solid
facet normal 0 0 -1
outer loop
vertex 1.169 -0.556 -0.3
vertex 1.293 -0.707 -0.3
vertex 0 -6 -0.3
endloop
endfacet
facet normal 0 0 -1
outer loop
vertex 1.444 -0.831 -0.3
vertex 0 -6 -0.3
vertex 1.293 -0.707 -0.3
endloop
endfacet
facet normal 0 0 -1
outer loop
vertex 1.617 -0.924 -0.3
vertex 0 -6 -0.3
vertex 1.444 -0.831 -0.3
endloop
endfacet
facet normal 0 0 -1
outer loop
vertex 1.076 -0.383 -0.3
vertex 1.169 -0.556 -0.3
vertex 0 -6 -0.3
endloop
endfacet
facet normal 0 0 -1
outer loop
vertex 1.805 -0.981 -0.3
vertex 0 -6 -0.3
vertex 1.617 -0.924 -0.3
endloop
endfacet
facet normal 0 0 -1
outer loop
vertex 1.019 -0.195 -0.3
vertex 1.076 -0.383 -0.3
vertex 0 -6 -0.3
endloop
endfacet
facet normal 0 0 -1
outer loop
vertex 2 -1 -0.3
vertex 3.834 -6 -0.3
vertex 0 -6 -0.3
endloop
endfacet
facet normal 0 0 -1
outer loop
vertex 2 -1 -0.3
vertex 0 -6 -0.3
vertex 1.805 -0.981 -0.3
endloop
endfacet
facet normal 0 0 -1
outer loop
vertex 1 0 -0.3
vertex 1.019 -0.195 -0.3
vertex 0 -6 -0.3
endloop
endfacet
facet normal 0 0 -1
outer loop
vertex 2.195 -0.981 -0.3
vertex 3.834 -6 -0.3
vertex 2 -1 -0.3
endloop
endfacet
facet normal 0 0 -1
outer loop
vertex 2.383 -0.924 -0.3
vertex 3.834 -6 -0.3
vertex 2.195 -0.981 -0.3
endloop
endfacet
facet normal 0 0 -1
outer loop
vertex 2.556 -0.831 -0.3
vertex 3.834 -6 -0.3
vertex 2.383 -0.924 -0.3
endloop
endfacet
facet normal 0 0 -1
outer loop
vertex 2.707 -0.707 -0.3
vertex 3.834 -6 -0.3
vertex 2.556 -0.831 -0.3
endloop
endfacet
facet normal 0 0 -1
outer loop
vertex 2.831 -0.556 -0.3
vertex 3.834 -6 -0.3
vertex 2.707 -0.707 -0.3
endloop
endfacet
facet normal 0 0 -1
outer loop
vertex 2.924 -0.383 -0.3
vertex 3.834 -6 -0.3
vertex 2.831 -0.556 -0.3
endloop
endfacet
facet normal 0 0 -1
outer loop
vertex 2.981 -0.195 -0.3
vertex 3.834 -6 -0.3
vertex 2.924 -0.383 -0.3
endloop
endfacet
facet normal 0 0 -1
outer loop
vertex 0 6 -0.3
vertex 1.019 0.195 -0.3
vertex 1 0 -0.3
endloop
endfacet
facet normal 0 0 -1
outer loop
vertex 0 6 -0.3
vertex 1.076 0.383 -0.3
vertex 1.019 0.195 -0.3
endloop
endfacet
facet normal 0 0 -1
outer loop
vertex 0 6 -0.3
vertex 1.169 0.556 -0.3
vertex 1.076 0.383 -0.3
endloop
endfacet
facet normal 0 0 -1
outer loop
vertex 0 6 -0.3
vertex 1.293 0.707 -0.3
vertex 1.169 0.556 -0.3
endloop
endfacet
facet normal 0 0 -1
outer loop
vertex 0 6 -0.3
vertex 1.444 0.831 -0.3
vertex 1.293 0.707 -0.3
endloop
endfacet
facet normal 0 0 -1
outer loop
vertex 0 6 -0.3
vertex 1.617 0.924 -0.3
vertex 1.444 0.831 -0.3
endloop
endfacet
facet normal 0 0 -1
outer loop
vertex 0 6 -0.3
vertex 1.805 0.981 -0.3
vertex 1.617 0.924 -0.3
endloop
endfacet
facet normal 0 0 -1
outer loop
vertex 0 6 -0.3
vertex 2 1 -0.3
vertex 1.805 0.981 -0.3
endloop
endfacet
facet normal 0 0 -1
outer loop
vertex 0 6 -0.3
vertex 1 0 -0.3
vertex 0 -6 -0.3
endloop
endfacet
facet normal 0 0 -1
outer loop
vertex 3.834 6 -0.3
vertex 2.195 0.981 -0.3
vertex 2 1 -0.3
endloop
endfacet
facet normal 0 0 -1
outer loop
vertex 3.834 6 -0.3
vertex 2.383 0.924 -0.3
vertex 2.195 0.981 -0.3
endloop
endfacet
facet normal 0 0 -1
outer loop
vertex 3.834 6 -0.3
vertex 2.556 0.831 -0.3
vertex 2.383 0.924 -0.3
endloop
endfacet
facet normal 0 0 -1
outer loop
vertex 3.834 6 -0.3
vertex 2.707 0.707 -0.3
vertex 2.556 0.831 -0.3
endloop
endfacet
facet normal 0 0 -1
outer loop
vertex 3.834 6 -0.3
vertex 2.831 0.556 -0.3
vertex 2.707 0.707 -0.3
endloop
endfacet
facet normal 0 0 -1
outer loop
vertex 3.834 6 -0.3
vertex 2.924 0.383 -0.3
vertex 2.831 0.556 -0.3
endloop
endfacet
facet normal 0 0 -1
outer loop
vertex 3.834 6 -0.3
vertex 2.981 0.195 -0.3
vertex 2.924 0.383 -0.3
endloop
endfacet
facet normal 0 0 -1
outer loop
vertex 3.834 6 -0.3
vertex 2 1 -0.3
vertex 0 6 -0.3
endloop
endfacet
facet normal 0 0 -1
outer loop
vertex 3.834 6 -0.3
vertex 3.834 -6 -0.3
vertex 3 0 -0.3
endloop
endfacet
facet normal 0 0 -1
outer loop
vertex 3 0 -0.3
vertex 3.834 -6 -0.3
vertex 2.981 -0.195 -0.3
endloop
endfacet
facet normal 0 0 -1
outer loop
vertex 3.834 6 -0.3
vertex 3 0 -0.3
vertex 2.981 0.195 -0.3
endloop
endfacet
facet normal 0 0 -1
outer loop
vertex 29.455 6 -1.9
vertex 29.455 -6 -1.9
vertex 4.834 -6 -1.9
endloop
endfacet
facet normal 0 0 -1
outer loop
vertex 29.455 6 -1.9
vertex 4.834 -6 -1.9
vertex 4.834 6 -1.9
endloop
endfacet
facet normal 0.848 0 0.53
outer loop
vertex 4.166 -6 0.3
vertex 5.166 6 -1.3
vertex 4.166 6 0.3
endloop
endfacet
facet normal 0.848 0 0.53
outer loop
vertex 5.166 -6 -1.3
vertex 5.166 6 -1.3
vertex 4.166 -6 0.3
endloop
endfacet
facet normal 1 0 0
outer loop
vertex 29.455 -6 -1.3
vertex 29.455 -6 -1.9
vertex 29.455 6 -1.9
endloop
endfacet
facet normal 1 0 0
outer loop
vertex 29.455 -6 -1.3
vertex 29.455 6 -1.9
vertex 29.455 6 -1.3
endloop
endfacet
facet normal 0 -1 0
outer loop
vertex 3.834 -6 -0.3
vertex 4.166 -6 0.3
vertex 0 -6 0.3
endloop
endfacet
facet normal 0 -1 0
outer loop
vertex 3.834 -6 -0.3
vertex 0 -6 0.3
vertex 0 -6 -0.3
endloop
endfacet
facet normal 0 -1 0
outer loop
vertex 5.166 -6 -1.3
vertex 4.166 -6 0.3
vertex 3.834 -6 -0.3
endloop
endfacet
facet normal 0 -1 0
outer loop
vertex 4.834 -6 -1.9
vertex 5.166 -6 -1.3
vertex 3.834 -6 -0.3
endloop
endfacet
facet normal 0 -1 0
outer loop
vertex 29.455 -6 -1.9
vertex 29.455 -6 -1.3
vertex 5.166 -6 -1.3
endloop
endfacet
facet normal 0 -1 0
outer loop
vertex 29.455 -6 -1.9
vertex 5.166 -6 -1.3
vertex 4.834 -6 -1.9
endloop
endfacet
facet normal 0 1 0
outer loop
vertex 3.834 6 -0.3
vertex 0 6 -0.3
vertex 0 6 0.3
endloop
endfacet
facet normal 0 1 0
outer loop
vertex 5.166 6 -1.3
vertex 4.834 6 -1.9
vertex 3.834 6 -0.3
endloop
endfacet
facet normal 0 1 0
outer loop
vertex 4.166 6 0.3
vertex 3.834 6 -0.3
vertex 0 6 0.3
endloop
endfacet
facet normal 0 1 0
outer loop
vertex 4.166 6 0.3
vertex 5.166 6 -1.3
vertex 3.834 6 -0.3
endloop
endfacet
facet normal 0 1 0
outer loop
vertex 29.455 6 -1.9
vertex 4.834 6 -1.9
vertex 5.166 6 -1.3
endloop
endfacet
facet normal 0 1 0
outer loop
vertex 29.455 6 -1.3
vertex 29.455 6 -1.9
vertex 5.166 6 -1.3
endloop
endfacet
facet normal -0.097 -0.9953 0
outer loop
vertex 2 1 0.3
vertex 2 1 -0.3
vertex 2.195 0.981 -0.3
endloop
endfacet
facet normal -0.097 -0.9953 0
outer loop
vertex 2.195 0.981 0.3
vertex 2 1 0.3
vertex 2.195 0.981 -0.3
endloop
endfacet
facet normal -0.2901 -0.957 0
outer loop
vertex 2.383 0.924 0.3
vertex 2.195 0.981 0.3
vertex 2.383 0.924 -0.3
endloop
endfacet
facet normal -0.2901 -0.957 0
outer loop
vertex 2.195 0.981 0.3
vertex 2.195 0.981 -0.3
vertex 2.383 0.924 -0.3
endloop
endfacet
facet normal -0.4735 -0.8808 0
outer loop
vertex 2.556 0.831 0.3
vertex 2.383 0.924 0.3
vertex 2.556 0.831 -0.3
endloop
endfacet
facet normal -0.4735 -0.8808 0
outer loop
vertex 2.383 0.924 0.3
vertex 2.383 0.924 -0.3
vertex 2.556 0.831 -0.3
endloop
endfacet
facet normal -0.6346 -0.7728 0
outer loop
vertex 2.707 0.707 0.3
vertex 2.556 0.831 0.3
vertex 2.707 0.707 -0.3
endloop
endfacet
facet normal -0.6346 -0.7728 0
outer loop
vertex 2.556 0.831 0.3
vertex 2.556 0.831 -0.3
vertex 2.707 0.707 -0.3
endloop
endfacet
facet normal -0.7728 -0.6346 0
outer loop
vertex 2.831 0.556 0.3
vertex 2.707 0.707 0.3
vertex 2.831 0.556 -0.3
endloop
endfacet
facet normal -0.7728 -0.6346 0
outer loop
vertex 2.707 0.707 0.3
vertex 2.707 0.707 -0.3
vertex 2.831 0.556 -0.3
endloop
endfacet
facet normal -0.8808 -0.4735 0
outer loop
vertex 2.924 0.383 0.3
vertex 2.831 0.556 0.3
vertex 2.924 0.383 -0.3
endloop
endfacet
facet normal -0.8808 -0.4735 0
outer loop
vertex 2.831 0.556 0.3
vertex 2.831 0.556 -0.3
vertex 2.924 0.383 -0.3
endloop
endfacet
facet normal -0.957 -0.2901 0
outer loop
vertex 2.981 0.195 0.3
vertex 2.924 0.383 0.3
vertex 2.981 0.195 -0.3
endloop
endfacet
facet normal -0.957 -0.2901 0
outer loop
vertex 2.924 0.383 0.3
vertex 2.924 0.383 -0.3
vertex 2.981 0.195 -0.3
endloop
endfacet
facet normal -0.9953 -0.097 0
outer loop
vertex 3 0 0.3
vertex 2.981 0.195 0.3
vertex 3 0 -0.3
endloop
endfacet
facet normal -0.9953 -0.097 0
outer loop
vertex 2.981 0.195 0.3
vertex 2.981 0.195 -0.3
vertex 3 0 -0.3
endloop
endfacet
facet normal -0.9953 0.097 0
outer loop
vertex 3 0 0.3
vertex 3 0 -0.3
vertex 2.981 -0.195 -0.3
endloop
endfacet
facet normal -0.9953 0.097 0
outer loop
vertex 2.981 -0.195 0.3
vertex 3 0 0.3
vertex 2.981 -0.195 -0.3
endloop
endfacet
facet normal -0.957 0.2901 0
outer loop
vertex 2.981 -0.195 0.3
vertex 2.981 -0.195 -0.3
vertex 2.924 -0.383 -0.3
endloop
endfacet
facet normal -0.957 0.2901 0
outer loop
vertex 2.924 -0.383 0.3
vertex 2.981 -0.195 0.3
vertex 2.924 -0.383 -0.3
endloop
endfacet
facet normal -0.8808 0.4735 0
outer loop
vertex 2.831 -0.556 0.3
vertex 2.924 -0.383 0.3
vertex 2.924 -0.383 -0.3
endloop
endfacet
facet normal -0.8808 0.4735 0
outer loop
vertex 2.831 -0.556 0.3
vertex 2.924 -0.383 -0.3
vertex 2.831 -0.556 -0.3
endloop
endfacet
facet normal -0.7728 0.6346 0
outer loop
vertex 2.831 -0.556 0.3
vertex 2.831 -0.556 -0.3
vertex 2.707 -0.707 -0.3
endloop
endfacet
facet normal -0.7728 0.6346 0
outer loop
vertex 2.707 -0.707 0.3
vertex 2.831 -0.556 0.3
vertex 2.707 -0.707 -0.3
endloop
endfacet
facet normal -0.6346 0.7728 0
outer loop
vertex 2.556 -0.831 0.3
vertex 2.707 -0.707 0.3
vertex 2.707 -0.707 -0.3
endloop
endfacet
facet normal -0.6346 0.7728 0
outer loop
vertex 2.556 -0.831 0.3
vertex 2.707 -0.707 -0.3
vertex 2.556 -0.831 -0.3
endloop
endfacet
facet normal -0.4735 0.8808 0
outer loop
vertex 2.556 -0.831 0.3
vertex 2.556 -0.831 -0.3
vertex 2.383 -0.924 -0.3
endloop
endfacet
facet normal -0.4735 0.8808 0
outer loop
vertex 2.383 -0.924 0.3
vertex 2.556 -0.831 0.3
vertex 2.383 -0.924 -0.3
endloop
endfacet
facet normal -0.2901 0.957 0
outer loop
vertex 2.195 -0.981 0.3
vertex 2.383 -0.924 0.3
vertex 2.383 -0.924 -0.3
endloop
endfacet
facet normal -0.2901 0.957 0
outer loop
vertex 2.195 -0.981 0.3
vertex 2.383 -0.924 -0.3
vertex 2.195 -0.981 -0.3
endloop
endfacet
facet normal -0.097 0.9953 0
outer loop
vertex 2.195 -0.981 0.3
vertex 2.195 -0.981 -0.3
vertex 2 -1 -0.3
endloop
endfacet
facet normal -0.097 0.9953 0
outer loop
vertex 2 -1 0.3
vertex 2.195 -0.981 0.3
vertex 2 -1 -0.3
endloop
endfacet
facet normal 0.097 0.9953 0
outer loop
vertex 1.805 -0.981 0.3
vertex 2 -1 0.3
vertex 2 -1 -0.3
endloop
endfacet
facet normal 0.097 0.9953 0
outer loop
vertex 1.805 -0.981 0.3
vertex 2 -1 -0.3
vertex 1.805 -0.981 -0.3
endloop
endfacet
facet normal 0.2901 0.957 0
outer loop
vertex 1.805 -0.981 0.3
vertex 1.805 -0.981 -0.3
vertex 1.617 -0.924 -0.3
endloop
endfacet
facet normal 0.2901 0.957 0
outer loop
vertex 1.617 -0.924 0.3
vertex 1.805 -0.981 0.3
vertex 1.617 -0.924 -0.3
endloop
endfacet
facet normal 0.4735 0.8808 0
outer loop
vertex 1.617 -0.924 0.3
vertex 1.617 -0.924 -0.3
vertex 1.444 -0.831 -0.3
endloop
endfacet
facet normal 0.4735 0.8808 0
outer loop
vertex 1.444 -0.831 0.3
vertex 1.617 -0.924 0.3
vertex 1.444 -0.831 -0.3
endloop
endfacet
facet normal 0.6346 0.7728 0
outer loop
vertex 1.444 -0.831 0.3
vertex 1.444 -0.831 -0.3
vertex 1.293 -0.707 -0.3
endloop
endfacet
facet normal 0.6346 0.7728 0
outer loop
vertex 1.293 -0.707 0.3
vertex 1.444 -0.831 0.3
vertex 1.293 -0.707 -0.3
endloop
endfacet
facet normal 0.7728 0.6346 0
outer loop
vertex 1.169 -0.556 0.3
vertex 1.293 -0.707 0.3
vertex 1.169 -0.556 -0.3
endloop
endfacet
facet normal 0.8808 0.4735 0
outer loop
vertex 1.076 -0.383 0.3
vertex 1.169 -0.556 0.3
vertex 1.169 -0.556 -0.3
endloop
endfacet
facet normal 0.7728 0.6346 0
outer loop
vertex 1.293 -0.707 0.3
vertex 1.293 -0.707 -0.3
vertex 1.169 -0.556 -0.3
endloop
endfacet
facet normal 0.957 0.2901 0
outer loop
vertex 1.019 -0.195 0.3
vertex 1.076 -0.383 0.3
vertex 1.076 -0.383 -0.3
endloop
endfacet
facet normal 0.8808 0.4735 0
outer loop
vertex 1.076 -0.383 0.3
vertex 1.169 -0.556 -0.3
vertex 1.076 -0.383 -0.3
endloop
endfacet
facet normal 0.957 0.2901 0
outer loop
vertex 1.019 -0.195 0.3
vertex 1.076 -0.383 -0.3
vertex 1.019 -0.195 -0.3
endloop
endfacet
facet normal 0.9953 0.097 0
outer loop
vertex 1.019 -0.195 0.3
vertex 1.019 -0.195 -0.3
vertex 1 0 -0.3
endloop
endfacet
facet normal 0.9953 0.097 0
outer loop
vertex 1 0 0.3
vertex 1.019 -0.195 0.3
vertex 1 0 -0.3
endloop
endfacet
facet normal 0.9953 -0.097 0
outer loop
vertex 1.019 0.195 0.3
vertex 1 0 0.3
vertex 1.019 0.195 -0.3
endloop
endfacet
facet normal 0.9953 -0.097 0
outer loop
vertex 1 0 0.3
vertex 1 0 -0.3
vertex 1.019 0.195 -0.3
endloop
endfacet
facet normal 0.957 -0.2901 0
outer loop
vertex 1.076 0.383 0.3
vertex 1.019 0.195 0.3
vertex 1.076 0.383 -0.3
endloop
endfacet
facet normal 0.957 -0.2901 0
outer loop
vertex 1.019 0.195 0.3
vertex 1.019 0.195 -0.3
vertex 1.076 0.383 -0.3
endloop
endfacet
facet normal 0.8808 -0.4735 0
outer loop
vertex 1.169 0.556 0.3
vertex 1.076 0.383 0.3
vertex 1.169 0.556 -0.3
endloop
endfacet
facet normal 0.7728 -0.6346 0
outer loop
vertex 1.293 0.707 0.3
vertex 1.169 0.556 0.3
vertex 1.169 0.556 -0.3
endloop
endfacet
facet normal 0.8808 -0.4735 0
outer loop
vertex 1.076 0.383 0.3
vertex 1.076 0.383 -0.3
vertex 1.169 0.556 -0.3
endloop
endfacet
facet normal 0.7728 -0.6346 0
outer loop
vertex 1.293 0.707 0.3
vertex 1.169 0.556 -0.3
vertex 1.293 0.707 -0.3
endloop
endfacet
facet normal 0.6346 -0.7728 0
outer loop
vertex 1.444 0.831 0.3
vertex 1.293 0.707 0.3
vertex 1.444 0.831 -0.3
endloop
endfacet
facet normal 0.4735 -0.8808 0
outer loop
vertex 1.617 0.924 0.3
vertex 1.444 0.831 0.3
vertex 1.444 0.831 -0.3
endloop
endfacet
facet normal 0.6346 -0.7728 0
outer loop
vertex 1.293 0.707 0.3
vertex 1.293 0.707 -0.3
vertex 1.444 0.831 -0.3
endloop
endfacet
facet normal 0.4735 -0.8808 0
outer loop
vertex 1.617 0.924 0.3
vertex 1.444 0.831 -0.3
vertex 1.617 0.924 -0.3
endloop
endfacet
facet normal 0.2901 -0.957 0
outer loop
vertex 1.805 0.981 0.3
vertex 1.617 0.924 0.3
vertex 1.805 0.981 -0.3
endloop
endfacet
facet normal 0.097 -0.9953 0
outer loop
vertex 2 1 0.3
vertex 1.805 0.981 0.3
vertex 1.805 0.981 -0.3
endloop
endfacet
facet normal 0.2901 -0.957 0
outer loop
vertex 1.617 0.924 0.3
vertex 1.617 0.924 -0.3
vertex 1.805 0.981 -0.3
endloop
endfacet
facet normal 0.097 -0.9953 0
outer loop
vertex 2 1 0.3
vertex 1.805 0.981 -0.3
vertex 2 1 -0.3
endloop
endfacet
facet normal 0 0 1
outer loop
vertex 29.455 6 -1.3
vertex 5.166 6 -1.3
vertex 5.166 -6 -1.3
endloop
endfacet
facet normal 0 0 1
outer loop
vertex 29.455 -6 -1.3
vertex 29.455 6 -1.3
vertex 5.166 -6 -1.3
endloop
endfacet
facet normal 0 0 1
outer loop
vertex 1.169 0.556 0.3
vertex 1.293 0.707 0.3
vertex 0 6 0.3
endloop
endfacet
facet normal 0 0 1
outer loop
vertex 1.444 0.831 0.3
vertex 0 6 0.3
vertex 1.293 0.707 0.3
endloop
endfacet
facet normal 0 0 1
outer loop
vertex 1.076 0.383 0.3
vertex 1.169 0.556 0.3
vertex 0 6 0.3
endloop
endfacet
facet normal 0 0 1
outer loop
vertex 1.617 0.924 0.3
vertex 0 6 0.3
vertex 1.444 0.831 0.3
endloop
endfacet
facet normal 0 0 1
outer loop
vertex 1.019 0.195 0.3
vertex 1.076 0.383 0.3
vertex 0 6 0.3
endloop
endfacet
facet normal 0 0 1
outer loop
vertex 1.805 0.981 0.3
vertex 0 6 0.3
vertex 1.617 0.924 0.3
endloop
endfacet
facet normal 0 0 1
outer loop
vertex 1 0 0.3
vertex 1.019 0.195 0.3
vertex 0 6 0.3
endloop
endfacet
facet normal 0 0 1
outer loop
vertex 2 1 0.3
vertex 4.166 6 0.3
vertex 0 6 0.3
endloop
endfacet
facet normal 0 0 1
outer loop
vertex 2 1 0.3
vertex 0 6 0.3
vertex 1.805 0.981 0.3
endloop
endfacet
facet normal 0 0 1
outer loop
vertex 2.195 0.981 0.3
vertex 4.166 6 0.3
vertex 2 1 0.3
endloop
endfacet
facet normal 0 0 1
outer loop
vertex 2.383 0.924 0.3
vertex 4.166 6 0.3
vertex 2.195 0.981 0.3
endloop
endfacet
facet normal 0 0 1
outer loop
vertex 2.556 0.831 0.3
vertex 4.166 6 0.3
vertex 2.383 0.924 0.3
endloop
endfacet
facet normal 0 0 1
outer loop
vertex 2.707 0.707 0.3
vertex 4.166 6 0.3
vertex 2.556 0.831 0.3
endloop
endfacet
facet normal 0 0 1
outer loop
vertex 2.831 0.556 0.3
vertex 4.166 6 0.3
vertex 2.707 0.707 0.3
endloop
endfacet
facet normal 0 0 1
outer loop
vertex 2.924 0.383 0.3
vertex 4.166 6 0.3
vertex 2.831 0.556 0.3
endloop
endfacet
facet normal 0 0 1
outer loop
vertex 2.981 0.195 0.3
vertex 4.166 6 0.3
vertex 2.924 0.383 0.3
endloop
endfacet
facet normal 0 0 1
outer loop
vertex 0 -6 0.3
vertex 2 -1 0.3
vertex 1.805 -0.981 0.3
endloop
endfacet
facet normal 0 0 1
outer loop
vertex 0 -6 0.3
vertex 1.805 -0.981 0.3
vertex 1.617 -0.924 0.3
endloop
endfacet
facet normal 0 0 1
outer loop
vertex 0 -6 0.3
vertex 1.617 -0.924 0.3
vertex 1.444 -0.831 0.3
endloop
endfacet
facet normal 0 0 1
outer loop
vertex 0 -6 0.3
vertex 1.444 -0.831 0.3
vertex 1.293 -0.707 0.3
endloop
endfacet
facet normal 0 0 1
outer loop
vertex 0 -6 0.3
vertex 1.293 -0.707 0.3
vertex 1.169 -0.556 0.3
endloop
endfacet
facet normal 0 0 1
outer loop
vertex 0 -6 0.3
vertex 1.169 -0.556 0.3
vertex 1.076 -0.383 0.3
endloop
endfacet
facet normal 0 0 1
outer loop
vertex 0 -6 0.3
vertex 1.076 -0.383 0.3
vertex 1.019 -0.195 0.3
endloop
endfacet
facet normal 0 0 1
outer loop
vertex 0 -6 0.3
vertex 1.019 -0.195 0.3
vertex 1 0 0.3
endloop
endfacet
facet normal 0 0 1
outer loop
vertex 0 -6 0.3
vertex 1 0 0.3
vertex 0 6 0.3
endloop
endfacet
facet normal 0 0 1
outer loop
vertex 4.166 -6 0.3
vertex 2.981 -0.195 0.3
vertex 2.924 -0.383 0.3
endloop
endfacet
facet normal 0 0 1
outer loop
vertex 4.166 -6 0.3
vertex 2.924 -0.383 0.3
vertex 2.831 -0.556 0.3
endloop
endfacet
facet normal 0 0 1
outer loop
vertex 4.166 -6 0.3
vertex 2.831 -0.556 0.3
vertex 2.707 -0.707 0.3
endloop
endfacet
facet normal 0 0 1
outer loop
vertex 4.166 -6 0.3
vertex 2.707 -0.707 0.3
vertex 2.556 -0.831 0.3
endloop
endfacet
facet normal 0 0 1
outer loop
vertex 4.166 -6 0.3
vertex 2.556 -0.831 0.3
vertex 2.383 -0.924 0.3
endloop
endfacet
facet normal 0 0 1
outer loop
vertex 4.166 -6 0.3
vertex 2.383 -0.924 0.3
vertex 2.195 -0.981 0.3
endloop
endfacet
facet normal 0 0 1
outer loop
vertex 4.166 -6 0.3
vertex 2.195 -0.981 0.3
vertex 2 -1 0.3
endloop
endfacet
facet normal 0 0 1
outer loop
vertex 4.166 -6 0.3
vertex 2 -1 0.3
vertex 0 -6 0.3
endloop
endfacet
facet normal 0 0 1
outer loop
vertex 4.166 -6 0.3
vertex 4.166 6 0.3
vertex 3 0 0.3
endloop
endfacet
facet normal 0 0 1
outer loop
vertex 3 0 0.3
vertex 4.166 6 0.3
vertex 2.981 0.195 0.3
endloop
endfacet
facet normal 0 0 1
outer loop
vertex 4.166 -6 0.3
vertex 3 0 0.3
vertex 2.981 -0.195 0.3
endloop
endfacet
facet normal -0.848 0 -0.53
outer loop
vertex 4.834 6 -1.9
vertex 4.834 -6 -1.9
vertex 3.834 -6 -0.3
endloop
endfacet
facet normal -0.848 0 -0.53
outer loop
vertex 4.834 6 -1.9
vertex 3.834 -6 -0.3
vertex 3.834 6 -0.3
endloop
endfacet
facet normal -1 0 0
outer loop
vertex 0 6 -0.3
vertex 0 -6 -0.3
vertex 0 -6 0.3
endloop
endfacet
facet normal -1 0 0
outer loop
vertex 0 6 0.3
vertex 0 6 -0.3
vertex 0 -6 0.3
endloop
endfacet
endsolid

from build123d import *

# Parameters (mm, degrees)
SKETCH2_W          = 0.6
SKETCH2_H          = 12
SKETCH3_R          = 1
CUT_EXTRUDE1_DEPTH = 10


with BuildPart() as part:
    # Sweep1: sweep along a path in Sketch1
    with BuildLine(Plane(origin=(0, 0, 0), x_dir=(1, 0, 0), z_dir=(0, 1, 0))) as sweep1_path:
        Line((0, 0), (4, 0))
        Line((4, 0), (5, 1.6))
        Line((5, 1.6), (29.454736631, 1.6))
    # Sketch2 → Sweep1 (sweep)
    with BuildSketch(Plane(origin=(0, 0, 0), x_dir=(0, 0, -1), z_dir=(1, 0, 0))):
        Rectangle(SKETCH2_W, SKETCH2_H)
    sweep(path=sweep1_path.line, transition=Transition.RIGHT)

    # Sketch3 → Cut-Extrude1 (cut)
    with BuildSketch(Plane(origin=(0, 0, -0.3), x_dir=(-1, 0, 0), z_dir=(0, 0, -1))):
        with Locations(Location((-2, 0, 0), (0, 0, 90))):
            Circle(SKETCH3_R)
    extrude(amount=-CUT_EXTRUDE1_DEPTH, mode=Mode.SUBTRACT)


solid = part.part
